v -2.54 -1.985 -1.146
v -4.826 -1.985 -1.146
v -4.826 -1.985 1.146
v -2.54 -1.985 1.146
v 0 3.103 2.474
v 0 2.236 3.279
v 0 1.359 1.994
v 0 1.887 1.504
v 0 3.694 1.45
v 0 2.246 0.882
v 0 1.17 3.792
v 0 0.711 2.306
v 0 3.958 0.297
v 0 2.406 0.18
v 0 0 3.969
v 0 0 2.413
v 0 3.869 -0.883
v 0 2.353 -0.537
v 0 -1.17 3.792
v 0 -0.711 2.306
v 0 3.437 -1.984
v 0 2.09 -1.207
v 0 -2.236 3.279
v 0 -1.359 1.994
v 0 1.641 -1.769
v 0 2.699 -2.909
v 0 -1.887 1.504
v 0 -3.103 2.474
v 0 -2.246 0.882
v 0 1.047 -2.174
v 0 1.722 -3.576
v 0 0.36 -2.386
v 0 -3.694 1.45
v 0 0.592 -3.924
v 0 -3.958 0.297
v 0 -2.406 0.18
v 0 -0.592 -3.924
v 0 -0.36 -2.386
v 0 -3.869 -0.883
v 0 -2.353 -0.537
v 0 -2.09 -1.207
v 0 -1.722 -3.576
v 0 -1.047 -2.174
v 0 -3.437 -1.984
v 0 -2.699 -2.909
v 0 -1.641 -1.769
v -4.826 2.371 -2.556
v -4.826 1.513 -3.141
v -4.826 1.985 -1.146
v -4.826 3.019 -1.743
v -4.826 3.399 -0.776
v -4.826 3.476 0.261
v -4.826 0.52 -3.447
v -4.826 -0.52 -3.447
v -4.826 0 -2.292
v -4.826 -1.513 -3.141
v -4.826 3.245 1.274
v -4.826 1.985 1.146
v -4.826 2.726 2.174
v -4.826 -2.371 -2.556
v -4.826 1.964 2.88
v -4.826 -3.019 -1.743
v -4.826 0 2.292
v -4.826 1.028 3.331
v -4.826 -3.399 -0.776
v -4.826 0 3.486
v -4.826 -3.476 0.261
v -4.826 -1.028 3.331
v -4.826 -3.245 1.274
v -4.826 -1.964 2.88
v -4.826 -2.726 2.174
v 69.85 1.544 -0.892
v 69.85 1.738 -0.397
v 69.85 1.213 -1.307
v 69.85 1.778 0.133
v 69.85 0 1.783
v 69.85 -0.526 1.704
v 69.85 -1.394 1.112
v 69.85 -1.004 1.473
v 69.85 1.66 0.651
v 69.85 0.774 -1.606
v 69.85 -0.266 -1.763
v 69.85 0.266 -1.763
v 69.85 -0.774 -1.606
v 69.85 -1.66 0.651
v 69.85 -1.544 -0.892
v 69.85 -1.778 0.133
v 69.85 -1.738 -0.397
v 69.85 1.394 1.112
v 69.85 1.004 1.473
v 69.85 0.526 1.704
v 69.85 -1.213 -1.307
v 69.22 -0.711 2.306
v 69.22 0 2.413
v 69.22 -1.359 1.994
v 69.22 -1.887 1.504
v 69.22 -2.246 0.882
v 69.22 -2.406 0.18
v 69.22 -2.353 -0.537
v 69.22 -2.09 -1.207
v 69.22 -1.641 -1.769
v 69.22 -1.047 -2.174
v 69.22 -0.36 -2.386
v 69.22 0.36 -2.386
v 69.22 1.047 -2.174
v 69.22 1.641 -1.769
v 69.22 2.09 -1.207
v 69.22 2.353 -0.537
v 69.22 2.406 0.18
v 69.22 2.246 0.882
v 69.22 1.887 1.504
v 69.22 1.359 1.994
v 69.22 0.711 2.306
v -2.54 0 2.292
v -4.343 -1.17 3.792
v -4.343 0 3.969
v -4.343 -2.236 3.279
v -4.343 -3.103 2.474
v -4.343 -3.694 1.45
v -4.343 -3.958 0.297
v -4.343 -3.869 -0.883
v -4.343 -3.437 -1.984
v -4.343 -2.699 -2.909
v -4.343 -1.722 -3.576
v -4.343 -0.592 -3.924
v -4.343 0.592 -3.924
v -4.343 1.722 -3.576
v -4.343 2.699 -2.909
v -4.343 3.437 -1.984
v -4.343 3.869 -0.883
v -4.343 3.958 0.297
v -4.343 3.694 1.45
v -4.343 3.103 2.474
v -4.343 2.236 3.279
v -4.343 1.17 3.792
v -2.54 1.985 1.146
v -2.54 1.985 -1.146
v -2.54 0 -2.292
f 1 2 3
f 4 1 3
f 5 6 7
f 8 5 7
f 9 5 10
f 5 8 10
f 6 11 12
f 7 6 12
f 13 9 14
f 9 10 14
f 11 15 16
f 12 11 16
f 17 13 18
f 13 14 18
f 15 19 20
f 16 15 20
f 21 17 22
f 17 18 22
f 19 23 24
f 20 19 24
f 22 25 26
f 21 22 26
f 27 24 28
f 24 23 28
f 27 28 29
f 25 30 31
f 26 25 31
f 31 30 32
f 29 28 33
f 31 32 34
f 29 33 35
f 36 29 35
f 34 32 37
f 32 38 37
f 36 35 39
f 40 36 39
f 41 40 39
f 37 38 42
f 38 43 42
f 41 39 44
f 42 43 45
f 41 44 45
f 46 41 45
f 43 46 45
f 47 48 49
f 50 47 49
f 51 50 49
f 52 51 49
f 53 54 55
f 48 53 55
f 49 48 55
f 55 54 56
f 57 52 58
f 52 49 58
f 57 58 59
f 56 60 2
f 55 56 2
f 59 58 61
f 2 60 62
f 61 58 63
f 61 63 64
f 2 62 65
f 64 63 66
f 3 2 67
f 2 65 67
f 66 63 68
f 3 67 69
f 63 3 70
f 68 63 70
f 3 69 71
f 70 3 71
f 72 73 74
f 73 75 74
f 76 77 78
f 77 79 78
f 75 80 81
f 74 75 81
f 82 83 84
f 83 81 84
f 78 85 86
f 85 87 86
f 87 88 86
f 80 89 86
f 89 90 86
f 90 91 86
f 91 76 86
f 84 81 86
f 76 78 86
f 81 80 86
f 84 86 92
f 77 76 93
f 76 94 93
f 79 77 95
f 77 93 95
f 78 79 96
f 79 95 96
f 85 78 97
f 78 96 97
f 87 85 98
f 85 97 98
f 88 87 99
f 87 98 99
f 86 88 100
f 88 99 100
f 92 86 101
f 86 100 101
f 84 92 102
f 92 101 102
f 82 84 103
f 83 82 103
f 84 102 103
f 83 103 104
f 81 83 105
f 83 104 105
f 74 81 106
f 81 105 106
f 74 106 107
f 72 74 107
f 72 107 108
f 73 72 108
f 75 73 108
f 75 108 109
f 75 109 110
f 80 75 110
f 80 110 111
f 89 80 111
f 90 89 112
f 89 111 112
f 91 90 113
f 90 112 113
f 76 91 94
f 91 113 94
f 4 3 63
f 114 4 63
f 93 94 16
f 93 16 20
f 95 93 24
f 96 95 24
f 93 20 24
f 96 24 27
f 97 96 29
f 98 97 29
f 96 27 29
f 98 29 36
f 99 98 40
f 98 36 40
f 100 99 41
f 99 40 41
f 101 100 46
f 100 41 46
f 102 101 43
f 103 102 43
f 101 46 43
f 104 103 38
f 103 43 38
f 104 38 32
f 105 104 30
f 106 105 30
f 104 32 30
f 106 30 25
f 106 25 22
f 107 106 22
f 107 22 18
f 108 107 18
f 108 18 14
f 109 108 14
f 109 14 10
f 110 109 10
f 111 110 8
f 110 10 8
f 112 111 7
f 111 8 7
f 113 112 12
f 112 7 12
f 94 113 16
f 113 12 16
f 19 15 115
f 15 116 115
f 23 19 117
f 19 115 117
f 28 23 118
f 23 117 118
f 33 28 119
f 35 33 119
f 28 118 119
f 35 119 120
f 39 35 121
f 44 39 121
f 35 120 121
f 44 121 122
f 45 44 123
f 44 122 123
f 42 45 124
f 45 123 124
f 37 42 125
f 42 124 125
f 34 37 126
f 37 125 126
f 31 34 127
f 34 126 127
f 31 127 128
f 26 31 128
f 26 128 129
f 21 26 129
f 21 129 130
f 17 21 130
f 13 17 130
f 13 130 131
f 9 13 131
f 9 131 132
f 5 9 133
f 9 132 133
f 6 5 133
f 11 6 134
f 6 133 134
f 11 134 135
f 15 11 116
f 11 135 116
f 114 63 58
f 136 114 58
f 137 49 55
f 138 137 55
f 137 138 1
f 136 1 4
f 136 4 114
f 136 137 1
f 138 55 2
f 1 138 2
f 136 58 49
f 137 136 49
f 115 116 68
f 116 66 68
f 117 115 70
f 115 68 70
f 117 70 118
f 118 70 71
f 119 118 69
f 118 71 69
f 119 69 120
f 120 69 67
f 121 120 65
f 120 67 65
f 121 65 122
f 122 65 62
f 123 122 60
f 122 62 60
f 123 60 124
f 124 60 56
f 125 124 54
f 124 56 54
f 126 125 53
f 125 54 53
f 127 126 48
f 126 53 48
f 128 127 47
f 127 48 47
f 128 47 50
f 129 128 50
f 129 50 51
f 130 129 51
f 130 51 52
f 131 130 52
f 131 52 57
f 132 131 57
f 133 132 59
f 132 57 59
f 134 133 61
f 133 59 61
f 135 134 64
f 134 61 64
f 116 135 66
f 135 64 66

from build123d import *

# Parameters (mm, degrees)
HEXDRIVE_DEPTH = 2.286


with BuildPart() as part:
    # BodySketch → BaseBody (revolve)
    with BuildSketch(Plane(origin=(0, 0, 0), x_dir=(1, 0, 0), z_dir=(0, 1, 0)), mode=Mode.PRIVATE) as basebody_sk:
        Polygon((0, 2.413), (0, 3.96875), (-4.3434, 3.96875), (-4.826, 3.48615), (-4.826, 0), (69.85, 0), (69.85, 1.78308), (69.22008, 2.413), align=None)
    revolve(basebody_sk.sketch.rotate(Axis((-4.826, 0, 0), (1, 0, 0)), 180), axis=Axis((-4.826, 0, 0), (1, 0, 0)))

    # DriveSketch → HexDrive (cut)
    with BuildSketch(Plane.ZY.offset(4.826)):
        Polygon((2.292092116, 0), (1.146046058, 1.98501), (-1.146046058, 1.98501), (-2.292092116, 0), (-1.146046058, -1.98501), (1.146046058, -1.98501), align=None)
    extrude(amount=-HEXDRIVE_DEPTH, mode=Mode.SUBTRACT)


solid = part.part
